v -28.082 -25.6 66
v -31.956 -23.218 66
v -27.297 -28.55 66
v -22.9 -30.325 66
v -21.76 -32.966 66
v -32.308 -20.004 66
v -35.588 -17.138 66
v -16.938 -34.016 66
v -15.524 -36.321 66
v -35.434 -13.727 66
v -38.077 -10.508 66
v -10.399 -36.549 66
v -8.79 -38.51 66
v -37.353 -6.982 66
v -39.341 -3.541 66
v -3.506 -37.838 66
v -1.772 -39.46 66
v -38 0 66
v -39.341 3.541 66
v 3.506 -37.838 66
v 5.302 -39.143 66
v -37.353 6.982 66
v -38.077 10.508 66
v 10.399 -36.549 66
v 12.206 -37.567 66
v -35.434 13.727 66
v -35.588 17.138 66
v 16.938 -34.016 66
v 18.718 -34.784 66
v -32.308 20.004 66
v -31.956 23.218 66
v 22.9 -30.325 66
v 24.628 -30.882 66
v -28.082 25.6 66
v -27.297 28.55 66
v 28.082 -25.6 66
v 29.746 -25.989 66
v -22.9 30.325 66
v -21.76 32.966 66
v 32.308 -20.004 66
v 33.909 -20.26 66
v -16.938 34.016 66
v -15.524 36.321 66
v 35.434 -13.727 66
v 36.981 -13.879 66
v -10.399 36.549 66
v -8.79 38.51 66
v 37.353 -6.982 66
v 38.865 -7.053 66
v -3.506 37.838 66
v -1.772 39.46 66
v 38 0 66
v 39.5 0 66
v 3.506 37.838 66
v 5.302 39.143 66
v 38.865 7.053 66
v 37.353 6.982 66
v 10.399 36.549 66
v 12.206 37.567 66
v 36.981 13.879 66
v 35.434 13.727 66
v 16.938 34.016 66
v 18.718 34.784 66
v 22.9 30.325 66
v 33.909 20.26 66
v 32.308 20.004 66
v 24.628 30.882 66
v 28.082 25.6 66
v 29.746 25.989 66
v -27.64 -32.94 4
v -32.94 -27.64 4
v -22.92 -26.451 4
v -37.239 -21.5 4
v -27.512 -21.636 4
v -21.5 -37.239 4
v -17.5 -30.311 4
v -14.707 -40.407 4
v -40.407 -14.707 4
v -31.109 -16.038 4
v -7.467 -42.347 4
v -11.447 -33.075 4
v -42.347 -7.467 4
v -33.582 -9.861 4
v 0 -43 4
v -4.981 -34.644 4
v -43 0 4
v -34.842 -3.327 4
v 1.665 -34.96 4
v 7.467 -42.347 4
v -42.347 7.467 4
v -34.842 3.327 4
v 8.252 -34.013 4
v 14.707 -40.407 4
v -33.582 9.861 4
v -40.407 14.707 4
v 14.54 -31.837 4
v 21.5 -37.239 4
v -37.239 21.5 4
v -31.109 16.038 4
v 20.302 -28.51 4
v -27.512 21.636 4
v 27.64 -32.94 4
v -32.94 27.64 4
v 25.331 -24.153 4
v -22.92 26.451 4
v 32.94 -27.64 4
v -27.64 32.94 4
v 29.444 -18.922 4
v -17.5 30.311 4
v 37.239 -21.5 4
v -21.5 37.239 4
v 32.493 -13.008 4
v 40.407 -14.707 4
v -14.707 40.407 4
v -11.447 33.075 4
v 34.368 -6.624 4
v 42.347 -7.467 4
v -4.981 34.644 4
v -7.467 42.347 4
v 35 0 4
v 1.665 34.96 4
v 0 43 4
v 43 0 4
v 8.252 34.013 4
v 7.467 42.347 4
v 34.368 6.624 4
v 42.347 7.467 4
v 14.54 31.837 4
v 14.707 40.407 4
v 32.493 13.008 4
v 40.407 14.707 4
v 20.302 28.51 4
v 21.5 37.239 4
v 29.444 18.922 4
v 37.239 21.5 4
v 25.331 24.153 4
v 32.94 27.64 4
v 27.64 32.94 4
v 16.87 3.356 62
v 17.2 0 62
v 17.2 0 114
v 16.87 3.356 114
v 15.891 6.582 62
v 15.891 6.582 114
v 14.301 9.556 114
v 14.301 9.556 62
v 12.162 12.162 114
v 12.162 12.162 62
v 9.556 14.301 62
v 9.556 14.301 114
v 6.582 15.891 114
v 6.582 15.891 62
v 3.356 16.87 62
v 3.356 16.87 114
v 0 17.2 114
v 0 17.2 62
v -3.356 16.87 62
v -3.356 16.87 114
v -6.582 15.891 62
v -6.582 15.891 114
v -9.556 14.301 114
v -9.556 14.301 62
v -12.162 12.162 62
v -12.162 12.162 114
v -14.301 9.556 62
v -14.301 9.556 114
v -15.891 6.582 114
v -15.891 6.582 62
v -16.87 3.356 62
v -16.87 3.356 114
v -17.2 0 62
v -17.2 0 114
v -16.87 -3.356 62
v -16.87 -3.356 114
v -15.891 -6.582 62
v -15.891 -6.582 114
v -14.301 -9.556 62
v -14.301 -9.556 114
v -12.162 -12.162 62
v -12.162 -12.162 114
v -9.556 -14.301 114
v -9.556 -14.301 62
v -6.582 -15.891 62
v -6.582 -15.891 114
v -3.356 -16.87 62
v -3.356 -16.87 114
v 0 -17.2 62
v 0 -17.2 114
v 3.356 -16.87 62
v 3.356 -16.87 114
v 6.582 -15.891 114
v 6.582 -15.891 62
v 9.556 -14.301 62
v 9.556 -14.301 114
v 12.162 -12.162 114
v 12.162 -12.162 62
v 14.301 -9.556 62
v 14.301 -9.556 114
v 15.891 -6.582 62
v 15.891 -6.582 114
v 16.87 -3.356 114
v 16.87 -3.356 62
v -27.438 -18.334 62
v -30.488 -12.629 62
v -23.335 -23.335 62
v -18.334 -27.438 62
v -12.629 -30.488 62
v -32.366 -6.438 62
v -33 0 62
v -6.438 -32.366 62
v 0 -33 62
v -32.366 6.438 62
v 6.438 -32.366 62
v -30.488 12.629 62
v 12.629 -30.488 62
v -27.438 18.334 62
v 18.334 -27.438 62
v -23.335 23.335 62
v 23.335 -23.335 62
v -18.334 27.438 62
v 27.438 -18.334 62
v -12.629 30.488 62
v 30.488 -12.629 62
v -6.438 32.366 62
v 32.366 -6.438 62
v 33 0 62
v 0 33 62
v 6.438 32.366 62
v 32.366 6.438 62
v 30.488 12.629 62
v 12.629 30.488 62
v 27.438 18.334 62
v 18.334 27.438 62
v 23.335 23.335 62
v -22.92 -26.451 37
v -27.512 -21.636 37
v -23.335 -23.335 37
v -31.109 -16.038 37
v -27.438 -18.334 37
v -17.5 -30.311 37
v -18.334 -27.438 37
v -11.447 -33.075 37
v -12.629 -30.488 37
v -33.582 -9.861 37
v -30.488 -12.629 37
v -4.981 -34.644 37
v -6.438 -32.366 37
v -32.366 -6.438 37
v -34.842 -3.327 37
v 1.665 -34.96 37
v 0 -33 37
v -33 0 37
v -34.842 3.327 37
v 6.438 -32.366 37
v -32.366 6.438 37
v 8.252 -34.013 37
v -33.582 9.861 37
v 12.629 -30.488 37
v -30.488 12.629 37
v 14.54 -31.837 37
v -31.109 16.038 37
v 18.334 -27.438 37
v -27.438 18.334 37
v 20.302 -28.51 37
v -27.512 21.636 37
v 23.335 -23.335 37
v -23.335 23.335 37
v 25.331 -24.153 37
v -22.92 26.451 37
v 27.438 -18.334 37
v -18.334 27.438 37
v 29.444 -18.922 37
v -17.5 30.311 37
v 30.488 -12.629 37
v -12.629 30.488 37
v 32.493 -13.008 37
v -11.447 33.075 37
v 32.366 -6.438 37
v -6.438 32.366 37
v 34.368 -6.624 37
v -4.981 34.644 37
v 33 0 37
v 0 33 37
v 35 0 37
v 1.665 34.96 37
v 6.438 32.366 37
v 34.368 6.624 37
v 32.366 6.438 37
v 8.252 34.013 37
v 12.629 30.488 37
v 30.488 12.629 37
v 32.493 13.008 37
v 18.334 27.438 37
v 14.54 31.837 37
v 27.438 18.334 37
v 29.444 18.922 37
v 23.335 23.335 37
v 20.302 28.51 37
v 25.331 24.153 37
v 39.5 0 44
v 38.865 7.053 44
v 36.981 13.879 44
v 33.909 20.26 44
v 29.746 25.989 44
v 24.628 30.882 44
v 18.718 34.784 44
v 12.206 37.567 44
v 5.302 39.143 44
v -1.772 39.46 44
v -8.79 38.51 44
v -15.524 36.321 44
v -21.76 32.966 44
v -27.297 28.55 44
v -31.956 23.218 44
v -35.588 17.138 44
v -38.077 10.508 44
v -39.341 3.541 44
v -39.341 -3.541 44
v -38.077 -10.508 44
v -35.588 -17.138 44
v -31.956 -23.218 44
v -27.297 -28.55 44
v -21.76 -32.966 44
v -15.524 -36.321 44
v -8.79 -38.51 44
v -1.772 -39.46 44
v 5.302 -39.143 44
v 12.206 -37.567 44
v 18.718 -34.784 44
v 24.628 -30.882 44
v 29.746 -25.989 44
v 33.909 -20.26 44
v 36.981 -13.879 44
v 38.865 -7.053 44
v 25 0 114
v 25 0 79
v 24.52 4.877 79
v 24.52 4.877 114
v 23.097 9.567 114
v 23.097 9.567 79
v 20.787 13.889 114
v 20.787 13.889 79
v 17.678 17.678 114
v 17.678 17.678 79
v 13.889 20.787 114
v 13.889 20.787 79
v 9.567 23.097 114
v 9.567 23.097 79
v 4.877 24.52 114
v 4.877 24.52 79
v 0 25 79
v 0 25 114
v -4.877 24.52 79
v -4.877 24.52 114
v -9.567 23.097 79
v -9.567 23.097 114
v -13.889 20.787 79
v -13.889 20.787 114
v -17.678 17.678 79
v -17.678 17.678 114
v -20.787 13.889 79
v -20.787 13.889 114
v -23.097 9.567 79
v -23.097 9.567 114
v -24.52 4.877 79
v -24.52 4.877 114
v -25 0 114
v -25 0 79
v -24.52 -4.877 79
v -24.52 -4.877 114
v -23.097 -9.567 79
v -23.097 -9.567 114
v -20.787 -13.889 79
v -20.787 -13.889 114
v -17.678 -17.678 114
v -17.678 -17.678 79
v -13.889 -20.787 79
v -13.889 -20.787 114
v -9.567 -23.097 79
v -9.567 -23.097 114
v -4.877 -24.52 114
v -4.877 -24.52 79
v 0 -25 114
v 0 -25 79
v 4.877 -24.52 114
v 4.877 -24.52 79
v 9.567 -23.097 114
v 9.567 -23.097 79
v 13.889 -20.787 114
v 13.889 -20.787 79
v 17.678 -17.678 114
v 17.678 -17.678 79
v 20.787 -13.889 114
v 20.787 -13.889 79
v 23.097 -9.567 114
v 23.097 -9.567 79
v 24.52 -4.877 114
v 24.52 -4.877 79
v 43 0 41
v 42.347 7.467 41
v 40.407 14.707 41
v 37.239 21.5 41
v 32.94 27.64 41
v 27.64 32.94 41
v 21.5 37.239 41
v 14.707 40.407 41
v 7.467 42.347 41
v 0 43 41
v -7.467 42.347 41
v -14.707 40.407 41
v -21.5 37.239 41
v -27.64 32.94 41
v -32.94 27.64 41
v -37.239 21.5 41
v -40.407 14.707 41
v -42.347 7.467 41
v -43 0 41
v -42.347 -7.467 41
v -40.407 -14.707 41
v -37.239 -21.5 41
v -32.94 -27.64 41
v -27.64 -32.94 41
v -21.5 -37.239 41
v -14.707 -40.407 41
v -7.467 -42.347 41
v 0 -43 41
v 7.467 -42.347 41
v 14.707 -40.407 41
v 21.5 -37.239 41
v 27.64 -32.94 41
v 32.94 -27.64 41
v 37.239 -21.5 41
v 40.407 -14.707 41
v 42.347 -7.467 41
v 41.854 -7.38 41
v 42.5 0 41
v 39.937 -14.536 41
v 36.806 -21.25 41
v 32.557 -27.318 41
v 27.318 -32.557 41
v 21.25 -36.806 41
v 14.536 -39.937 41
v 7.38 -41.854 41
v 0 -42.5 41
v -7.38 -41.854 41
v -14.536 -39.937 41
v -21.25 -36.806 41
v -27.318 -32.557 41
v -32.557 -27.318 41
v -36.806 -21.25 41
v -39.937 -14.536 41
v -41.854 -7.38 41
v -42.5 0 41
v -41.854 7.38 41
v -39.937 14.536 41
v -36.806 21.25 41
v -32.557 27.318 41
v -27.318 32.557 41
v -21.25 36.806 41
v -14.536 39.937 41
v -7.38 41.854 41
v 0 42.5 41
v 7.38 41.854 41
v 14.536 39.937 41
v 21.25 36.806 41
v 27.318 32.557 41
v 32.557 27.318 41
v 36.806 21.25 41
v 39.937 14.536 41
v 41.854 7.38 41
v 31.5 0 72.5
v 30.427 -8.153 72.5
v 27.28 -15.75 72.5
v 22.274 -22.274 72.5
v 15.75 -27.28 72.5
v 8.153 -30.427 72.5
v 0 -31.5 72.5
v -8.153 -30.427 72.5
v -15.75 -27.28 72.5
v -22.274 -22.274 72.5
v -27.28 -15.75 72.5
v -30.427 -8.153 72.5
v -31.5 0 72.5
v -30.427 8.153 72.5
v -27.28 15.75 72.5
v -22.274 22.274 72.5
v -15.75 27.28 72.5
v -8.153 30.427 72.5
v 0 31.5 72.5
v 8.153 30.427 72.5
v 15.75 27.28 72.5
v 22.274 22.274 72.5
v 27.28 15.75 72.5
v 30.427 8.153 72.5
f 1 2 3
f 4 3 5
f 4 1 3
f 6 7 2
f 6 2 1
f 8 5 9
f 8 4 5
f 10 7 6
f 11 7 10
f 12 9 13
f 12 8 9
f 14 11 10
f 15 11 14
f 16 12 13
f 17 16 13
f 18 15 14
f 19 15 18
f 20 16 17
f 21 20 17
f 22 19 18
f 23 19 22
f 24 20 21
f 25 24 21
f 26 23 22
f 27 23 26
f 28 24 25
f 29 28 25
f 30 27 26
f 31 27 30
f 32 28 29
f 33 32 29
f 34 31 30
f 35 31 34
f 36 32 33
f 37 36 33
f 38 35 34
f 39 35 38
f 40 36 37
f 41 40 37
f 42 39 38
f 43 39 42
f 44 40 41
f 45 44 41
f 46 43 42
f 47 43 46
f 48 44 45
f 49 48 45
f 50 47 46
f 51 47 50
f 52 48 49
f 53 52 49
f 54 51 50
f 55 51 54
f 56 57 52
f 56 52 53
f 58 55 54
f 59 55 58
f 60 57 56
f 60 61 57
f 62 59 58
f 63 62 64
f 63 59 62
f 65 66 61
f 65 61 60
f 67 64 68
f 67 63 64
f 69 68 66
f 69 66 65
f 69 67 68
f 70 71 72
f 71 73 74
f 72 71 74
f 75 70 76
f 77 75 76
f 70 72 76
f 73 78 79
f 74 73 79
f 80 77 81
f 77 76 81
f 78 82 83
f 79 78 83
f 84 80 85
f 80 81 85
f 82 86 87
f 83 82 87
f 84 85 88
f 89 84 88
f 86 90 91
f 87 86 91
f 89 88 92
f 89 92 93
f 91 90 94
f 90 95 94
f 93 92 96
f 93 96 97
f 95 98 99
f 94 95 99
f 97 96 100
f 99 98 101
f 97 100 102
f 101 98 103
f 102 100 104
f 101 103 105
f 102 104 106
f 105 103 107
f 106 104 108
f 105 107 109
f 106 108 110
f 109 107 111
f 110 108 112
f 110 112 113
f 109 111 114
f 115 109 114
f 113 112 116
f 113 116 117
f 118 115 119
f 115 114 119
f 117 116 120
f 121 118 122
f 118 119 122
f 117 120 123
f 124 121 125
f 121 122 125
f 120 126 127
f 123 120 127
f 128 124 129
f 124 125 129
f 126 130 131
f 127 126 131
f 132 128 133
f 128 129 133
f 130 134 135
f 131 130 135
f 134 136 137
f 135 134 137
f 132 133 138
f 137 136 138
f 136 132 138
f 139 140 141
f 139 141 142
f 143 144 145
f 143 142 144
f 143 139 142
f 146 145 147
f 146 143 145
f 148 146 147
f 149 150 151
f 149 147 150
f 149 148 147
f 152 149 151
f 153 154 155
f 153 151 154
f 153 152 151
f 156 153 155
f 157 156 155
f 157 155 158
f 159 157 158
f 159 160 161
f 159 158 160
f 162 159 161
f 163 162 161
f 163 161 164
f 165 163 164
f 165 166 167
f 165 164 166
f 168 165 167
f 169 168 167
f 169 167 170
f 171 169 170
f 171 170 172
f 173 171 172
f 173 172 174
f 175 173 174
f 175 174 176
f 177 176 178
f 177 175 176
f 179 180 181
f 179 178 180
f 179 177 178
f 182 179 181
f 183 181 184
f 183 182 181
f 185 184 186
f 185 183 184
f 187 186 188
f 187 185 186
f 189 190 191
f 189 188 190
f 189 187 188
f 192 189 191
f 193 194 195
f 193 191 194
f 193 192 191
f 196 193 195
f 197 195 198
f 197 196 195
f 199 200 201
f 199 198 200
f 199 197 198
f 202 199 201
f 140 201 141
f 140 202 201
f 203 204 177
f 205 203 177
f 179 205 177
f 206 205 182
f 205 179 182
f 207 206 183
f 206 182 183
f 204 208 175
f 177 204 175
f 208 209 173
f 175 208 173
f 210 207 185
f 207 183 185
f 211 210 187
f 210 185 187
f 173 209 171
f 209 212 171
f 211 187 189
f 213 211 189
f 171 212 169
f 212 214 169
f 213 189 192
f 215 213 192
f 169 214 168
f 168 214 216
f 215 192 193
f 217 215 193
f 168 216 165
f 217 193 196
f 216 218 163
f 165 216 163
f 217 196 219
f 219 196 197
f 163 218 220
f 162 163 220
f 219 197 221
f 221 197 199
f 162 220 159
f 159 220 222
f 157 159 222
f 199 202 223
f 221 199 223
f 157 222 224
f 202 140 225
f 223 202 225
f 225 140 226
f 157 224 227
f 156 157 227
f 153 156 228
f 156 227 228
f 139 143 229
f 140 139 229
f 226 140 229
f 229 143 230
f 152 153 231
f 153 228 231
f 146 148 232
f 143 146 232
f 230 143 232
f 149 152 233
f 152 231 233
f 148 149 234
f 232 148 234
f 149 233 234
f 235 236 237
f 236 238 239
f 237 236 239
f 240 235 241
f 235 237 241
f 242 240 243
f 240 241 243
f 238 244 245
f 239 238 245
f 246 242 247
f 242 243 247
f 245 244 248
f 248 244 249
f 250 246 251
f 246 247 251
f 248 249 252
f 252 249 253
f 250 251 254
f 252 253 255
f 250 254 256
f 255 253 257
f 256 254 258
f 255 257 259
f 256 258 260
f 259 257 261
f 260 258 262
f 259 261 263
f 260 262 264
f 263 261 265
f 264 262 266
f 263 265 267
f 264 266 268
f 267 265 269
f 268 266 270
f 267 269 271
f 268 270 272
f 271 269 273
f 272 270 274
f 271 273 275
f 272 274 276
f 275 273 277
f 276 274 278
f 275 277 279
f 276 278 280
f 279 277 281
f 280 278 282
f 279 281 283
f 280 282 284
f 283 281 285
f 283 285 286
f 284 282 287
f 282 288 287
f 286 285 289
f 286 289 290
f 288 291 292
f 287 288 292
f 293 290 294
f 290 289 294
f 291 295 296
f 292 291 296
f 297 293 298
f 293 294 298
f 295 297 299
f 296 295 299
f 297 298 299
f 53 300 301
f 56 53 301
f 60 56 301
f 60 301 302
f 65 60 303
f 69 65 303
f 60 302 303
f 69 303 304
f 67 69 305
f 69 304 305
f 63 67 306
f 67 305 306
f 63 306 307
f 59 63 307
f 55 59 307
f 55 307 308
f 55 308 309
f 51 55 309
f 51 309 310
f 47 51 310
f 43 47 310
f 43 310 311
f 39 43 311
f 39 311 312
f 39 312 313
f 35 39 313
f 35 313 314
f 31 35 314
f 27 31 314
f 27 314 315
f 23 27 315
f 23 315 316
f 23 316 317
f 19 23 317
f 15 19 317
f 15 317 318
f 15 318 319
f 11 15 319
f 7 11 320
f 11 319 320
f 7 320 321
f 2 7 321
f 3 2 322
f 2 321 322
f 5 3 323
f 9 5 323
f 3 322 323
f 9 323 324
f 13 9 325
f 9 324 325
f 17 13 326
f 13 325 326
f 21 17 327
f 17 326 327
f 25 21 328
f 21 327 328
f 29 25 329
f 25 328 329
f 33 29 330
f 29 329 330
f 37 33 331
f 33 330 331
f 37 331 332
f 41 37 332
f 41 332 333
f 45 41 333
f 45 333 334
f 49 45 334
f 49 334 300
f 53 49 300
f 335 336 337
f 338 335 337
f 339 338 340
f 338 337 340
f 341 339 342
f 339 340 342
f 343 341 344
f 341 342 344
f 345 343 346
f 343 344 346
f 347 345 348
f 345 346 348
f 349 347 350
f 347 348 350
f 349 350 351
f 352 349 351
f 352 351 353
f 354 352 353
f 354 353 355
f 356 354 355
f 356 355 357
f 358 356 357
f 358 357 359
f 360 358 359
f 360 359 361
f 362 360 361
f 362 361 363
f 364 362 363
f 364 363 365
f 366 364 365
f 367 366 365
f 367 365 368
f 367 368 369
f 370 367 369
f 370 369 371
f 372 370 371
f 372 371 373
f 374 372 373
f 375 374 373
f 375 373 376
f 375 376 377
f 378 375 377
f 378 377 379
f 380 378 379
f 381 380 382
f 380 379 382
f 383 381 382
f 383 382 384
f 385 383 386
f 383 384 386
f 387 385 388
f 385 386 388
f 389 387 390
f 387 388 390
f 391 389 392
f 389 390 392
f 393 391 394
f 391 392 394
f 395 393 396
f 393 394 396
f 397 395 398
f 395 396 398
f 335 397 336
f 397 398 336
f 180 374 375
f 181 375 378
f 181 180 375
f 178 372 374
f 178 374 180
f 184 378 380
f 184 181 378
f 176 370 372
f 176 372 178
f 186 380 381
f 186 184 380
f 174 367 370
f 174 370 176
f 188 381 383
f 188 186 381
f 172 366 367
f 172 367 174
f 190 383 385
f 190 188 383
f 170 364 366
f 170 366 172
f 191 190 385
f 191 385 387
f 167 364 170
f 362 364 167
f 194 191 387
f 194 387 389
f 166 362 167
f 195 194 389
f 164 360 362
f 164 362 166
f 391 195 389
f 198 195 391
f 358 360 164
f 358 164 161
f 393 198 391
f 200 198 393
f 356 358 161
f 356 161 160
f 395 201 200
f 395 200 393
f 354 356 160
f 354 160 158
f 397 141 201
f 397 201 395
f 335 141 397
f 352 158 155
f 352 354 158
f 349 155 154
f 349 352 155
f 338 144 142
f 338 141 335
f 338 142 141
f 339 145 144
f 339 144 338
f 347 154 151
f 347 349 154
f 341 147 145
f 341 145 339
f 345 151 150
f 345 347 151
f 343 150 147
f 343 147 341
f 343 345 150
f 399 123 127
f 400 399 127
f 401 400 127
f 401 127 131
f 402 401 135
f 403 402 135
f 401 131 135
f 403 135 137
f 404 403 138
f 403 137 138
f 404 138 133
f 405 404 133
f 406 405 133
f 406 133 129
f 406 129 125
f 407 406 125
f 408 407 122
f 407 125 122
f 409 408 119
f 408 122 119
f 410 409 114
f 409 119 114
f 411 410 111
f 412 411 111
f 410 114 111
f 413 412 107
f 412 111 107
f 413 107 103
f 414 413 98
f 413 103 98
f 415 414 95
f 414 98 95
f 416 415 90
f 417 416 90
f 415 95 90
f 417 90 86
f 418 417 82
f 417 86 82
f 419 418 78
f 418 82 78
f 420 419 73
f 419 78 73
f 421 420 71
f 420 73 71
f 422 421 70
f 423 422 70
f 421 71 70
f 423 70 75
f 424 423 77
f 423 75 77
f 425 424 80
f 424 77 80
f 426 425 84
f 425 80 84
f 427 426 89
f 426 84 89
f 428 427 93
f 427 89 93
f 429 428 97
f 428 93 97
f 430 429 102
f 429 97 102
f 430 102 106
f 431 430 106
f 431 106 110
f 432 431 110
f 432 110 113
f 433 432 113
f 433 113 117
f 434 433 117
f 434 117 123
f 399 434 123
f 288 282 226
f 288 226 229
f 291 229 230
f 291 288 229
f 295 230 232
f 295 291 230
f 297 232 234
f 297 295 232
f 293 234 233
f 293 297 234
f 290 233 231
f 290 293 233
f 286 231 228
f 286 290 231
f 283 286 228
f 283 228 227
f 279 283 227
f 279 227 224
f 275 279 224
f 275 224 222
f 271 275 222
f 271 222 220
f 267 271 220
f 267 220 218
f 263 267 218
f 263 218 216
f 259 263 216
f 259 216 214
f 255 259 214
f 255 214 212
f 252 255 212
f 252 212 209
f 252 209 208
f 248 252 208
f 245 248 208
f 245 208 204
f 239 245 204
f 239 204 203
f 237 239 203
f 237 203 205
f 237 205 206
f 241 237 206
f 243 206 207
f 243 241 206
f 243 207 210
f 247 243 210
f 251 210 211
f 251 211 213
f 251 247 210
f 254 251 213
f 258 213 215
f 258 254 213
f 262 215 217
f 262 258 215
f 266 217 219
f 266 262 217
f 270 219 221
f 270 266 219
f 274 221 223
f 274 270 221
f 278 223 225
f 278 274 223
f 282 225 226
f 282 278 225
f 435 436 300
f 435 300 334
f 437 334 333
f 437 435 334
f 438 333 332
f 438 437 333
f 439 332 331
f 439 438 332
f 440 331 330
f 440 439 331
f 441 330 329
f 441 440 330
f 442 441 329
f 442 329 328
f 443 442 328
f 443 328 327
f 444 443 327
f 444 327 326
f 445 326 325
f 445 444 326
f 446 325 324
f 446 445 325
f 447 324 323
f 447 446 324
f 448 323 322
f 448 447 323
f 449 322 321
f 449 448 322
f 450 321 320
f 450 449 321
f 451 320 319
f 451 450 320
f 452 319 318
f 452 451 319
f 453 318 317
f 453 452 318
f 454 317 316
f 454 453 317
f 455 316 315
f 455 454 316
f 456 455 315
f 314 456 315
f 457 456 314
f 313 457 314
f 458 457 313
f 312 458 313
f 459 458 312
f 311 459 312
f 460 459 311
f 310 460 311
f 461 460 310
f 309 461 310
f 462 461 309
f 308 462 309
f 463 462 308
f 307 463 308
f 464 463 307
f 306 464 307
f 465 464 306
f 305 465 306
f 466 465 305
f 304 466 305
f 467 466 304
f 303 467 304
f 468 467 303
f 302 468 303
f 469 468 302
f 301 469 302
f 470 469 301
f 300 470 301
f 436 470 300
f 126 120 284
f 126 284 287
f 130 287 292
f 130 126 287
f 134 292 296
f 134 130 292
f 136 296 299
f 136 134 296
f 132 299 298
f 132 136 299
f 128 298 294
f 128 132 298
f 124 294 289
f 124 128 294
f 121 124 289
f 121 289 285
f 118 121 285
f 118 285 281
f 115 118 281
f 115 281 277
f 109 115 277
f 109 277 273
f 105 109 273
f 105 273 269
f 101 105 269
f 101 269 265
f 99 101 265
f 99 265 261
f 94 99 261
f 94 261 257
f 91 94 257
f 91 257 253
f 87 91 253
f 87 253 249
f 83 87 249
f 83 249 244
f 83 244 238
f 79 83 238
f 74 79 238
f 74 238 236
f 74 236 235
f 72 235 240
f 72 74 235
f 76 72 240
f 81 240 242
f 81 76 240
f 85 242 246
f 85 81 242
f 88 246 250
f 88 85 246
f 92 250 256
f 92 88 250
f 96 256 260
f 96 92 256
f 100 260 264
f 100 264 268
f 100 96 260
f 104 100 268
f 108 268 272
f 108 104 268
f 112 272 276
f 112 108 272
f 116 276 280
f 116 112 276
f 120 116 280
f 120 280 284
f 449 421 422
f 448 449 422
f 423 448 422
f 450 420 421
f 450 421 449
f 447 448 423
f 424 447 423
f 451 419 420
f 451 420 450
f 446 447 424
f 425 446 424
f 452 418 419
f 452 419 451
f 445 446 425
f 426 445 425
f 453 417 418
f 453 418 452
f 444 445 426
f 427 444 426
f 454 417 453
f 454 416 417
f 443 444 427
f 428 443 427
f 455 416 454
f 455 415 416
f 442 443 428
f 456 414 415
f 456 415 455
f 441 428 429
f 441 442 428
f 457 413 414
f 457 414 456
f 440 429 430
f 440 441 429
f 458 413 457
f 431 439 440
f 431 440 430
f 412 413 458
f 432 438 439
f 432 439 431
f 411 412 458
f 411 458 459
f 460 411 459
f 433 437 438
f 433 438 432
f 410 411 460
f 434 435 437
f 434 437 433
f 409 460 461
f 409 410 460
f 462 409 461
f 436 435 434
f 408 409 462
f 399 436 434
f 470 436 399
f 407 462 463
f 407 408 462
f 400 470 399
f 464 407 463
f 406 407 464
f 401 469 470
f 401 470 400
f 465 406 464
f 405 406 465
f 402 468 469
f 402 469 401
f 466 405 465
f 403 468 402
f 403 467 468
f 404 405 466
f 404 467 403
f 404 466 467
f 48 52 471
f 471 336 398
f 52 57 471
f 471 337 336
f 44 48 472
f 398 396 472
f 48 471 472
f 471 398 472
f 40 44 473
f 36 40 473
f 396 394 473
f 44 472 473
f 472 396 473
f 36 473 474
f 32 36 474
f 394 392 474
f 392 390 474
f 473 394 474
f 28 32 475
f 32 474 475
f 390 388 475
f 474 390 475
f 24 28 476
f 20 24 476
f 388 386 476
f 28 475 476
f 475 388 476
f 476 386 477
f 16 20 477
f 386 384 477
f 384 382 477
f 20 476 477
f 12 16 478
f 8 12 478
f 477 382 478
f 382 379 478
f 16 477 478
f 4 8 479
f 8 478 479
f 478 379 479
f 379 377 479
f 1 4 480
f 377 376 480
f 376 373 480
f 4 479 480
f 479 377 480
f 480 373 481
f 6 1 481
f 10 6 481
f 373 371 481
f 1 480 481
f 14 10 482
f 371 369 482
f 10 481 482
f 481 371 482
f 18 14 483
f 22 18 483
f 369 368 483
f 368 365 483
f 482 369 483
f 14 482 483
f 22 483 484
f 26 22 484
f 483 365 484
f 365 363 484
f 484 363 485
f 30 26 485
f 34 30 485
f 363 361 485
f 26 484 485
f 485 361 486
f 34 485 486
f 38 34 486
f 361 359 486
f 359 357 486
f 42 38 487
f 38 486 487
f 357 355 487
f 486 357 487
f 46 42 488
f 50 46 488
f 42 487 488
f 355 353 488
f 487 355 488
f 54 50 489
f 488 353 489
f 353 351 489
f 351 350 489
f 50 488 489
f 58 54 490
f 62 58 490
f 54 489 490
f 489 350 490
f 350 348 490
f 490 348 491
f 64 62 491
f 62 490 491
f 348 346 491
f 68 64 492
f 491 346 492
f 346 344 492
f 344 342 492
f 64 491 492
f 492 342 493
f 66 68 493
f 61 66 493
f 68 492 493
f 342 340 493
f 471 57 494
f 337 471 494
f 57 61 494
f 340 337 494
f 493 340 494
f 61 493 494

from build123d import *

# Parameters (mm, degrees)
CYLINDER006_R     = 33
CYLINDER006_DEPTH = 26
CYLINDER005_R     = 35
CYLINDER005_DEPTH = 37
CYLINDER004_R     = 17.2
CYLINDER004_DEPTH = 63
CYLINDER001_R     = 39.5
CYLINDER001_DEPTH = 26
CYLINDER_R        = 43
CYLINDER_DEPTH    = 37
CYLINDER003_R     = 25
CYLINDER003_DEPTH = 49
CHAMFER_SIZE      = 13
CHAMFER001_SIZE   = 3


with BuildPart() as cylinder006:
    # Cylinder006 → Cylinder006 (new body)
    with BuildSketch(Plane.XY.offset(36)):
        Circle(CYLINDER006_R)
    extrude(amount=CYLINDER006_DEPTH)


with BuildPart() as cylinder005:
    # Cylinder005 → Cylinder005 (new body)
    with BuildSketch(Plane.XY):
        Circle(CYLINDER005_R)
    extrude(amount=CYLINDER005_DEPTH)


with BuildPart() as cylinder004:
    # Cylinder004 → Cylinder004 (new body)
    with BuildSketch(Plane.XY.offset(61)):
        Circle(CYLINDER004_R)
    extrude(amount=CYLINDER004_DEPTH)


with BuildPart() as cylinder001:
    # Cylinder001 → Cylinder001 (new body)
    with BuildSketch(Plane.XY.offset(36)):
        Circle(CYLINDER001_R)
    extrude(amount=CYLINDER001_DEPTH)


with BuildPart() as fusion003:
    # Cylinder → Cylinder (new body)
    with BuildSketch(Plane.XY):
        Circle(CYLINDER_R)
    extrude(amount=CYLINDER_DEPTH)

    # Fusion003: union Cylinder001
    add(cylinder001.part)


with BuildPart() as chamfer001:
    # Cylinder003 → Cylinder003 (new body)
    with BuildSketch(Plane.XY.offset(61)):
        Circle(CYLINDER003_R)
    extrude(amount=CYLINDER003_DEPTH)

    # Fusion002: union Fusion003
    add(fusion003.part)


with BuildPart() as chamfer001_1:
    # Fusion002 placement: moved
    add(chamfer001.part.moved(Location((0, 0, 4))))

    # Cut: cut Cylinder004
    add(cylinder004.part, mode=Mode.SUBTRACT)

    # Cut001: cut Cylinder005
    add(cylinder005.part, mode=Mode.SUBTRACT)

    # Cut002: cut Cylinder006
    add(cylinder006.part, mode=Mode.SUBTRACT)

    # Chamfer
    chamfer_edges = [chamfer001_1.edges().sort_by_distance(p)[0] for p in [
        (-25, 0, 66),
    ]]
    chamfer(chamfer_edges, length=CHAMFER_SIZE)

    # Chamfer001
    chamfer001_edges = [chamfer001_1.edges().sort_by_distance(p)[0] for p in [
        (-39.5, 0, 41),
    ]]
    chamfer(chamfer001_edges, length=CHAMFER001_SIZE)


solid = chamfer001_1.part
